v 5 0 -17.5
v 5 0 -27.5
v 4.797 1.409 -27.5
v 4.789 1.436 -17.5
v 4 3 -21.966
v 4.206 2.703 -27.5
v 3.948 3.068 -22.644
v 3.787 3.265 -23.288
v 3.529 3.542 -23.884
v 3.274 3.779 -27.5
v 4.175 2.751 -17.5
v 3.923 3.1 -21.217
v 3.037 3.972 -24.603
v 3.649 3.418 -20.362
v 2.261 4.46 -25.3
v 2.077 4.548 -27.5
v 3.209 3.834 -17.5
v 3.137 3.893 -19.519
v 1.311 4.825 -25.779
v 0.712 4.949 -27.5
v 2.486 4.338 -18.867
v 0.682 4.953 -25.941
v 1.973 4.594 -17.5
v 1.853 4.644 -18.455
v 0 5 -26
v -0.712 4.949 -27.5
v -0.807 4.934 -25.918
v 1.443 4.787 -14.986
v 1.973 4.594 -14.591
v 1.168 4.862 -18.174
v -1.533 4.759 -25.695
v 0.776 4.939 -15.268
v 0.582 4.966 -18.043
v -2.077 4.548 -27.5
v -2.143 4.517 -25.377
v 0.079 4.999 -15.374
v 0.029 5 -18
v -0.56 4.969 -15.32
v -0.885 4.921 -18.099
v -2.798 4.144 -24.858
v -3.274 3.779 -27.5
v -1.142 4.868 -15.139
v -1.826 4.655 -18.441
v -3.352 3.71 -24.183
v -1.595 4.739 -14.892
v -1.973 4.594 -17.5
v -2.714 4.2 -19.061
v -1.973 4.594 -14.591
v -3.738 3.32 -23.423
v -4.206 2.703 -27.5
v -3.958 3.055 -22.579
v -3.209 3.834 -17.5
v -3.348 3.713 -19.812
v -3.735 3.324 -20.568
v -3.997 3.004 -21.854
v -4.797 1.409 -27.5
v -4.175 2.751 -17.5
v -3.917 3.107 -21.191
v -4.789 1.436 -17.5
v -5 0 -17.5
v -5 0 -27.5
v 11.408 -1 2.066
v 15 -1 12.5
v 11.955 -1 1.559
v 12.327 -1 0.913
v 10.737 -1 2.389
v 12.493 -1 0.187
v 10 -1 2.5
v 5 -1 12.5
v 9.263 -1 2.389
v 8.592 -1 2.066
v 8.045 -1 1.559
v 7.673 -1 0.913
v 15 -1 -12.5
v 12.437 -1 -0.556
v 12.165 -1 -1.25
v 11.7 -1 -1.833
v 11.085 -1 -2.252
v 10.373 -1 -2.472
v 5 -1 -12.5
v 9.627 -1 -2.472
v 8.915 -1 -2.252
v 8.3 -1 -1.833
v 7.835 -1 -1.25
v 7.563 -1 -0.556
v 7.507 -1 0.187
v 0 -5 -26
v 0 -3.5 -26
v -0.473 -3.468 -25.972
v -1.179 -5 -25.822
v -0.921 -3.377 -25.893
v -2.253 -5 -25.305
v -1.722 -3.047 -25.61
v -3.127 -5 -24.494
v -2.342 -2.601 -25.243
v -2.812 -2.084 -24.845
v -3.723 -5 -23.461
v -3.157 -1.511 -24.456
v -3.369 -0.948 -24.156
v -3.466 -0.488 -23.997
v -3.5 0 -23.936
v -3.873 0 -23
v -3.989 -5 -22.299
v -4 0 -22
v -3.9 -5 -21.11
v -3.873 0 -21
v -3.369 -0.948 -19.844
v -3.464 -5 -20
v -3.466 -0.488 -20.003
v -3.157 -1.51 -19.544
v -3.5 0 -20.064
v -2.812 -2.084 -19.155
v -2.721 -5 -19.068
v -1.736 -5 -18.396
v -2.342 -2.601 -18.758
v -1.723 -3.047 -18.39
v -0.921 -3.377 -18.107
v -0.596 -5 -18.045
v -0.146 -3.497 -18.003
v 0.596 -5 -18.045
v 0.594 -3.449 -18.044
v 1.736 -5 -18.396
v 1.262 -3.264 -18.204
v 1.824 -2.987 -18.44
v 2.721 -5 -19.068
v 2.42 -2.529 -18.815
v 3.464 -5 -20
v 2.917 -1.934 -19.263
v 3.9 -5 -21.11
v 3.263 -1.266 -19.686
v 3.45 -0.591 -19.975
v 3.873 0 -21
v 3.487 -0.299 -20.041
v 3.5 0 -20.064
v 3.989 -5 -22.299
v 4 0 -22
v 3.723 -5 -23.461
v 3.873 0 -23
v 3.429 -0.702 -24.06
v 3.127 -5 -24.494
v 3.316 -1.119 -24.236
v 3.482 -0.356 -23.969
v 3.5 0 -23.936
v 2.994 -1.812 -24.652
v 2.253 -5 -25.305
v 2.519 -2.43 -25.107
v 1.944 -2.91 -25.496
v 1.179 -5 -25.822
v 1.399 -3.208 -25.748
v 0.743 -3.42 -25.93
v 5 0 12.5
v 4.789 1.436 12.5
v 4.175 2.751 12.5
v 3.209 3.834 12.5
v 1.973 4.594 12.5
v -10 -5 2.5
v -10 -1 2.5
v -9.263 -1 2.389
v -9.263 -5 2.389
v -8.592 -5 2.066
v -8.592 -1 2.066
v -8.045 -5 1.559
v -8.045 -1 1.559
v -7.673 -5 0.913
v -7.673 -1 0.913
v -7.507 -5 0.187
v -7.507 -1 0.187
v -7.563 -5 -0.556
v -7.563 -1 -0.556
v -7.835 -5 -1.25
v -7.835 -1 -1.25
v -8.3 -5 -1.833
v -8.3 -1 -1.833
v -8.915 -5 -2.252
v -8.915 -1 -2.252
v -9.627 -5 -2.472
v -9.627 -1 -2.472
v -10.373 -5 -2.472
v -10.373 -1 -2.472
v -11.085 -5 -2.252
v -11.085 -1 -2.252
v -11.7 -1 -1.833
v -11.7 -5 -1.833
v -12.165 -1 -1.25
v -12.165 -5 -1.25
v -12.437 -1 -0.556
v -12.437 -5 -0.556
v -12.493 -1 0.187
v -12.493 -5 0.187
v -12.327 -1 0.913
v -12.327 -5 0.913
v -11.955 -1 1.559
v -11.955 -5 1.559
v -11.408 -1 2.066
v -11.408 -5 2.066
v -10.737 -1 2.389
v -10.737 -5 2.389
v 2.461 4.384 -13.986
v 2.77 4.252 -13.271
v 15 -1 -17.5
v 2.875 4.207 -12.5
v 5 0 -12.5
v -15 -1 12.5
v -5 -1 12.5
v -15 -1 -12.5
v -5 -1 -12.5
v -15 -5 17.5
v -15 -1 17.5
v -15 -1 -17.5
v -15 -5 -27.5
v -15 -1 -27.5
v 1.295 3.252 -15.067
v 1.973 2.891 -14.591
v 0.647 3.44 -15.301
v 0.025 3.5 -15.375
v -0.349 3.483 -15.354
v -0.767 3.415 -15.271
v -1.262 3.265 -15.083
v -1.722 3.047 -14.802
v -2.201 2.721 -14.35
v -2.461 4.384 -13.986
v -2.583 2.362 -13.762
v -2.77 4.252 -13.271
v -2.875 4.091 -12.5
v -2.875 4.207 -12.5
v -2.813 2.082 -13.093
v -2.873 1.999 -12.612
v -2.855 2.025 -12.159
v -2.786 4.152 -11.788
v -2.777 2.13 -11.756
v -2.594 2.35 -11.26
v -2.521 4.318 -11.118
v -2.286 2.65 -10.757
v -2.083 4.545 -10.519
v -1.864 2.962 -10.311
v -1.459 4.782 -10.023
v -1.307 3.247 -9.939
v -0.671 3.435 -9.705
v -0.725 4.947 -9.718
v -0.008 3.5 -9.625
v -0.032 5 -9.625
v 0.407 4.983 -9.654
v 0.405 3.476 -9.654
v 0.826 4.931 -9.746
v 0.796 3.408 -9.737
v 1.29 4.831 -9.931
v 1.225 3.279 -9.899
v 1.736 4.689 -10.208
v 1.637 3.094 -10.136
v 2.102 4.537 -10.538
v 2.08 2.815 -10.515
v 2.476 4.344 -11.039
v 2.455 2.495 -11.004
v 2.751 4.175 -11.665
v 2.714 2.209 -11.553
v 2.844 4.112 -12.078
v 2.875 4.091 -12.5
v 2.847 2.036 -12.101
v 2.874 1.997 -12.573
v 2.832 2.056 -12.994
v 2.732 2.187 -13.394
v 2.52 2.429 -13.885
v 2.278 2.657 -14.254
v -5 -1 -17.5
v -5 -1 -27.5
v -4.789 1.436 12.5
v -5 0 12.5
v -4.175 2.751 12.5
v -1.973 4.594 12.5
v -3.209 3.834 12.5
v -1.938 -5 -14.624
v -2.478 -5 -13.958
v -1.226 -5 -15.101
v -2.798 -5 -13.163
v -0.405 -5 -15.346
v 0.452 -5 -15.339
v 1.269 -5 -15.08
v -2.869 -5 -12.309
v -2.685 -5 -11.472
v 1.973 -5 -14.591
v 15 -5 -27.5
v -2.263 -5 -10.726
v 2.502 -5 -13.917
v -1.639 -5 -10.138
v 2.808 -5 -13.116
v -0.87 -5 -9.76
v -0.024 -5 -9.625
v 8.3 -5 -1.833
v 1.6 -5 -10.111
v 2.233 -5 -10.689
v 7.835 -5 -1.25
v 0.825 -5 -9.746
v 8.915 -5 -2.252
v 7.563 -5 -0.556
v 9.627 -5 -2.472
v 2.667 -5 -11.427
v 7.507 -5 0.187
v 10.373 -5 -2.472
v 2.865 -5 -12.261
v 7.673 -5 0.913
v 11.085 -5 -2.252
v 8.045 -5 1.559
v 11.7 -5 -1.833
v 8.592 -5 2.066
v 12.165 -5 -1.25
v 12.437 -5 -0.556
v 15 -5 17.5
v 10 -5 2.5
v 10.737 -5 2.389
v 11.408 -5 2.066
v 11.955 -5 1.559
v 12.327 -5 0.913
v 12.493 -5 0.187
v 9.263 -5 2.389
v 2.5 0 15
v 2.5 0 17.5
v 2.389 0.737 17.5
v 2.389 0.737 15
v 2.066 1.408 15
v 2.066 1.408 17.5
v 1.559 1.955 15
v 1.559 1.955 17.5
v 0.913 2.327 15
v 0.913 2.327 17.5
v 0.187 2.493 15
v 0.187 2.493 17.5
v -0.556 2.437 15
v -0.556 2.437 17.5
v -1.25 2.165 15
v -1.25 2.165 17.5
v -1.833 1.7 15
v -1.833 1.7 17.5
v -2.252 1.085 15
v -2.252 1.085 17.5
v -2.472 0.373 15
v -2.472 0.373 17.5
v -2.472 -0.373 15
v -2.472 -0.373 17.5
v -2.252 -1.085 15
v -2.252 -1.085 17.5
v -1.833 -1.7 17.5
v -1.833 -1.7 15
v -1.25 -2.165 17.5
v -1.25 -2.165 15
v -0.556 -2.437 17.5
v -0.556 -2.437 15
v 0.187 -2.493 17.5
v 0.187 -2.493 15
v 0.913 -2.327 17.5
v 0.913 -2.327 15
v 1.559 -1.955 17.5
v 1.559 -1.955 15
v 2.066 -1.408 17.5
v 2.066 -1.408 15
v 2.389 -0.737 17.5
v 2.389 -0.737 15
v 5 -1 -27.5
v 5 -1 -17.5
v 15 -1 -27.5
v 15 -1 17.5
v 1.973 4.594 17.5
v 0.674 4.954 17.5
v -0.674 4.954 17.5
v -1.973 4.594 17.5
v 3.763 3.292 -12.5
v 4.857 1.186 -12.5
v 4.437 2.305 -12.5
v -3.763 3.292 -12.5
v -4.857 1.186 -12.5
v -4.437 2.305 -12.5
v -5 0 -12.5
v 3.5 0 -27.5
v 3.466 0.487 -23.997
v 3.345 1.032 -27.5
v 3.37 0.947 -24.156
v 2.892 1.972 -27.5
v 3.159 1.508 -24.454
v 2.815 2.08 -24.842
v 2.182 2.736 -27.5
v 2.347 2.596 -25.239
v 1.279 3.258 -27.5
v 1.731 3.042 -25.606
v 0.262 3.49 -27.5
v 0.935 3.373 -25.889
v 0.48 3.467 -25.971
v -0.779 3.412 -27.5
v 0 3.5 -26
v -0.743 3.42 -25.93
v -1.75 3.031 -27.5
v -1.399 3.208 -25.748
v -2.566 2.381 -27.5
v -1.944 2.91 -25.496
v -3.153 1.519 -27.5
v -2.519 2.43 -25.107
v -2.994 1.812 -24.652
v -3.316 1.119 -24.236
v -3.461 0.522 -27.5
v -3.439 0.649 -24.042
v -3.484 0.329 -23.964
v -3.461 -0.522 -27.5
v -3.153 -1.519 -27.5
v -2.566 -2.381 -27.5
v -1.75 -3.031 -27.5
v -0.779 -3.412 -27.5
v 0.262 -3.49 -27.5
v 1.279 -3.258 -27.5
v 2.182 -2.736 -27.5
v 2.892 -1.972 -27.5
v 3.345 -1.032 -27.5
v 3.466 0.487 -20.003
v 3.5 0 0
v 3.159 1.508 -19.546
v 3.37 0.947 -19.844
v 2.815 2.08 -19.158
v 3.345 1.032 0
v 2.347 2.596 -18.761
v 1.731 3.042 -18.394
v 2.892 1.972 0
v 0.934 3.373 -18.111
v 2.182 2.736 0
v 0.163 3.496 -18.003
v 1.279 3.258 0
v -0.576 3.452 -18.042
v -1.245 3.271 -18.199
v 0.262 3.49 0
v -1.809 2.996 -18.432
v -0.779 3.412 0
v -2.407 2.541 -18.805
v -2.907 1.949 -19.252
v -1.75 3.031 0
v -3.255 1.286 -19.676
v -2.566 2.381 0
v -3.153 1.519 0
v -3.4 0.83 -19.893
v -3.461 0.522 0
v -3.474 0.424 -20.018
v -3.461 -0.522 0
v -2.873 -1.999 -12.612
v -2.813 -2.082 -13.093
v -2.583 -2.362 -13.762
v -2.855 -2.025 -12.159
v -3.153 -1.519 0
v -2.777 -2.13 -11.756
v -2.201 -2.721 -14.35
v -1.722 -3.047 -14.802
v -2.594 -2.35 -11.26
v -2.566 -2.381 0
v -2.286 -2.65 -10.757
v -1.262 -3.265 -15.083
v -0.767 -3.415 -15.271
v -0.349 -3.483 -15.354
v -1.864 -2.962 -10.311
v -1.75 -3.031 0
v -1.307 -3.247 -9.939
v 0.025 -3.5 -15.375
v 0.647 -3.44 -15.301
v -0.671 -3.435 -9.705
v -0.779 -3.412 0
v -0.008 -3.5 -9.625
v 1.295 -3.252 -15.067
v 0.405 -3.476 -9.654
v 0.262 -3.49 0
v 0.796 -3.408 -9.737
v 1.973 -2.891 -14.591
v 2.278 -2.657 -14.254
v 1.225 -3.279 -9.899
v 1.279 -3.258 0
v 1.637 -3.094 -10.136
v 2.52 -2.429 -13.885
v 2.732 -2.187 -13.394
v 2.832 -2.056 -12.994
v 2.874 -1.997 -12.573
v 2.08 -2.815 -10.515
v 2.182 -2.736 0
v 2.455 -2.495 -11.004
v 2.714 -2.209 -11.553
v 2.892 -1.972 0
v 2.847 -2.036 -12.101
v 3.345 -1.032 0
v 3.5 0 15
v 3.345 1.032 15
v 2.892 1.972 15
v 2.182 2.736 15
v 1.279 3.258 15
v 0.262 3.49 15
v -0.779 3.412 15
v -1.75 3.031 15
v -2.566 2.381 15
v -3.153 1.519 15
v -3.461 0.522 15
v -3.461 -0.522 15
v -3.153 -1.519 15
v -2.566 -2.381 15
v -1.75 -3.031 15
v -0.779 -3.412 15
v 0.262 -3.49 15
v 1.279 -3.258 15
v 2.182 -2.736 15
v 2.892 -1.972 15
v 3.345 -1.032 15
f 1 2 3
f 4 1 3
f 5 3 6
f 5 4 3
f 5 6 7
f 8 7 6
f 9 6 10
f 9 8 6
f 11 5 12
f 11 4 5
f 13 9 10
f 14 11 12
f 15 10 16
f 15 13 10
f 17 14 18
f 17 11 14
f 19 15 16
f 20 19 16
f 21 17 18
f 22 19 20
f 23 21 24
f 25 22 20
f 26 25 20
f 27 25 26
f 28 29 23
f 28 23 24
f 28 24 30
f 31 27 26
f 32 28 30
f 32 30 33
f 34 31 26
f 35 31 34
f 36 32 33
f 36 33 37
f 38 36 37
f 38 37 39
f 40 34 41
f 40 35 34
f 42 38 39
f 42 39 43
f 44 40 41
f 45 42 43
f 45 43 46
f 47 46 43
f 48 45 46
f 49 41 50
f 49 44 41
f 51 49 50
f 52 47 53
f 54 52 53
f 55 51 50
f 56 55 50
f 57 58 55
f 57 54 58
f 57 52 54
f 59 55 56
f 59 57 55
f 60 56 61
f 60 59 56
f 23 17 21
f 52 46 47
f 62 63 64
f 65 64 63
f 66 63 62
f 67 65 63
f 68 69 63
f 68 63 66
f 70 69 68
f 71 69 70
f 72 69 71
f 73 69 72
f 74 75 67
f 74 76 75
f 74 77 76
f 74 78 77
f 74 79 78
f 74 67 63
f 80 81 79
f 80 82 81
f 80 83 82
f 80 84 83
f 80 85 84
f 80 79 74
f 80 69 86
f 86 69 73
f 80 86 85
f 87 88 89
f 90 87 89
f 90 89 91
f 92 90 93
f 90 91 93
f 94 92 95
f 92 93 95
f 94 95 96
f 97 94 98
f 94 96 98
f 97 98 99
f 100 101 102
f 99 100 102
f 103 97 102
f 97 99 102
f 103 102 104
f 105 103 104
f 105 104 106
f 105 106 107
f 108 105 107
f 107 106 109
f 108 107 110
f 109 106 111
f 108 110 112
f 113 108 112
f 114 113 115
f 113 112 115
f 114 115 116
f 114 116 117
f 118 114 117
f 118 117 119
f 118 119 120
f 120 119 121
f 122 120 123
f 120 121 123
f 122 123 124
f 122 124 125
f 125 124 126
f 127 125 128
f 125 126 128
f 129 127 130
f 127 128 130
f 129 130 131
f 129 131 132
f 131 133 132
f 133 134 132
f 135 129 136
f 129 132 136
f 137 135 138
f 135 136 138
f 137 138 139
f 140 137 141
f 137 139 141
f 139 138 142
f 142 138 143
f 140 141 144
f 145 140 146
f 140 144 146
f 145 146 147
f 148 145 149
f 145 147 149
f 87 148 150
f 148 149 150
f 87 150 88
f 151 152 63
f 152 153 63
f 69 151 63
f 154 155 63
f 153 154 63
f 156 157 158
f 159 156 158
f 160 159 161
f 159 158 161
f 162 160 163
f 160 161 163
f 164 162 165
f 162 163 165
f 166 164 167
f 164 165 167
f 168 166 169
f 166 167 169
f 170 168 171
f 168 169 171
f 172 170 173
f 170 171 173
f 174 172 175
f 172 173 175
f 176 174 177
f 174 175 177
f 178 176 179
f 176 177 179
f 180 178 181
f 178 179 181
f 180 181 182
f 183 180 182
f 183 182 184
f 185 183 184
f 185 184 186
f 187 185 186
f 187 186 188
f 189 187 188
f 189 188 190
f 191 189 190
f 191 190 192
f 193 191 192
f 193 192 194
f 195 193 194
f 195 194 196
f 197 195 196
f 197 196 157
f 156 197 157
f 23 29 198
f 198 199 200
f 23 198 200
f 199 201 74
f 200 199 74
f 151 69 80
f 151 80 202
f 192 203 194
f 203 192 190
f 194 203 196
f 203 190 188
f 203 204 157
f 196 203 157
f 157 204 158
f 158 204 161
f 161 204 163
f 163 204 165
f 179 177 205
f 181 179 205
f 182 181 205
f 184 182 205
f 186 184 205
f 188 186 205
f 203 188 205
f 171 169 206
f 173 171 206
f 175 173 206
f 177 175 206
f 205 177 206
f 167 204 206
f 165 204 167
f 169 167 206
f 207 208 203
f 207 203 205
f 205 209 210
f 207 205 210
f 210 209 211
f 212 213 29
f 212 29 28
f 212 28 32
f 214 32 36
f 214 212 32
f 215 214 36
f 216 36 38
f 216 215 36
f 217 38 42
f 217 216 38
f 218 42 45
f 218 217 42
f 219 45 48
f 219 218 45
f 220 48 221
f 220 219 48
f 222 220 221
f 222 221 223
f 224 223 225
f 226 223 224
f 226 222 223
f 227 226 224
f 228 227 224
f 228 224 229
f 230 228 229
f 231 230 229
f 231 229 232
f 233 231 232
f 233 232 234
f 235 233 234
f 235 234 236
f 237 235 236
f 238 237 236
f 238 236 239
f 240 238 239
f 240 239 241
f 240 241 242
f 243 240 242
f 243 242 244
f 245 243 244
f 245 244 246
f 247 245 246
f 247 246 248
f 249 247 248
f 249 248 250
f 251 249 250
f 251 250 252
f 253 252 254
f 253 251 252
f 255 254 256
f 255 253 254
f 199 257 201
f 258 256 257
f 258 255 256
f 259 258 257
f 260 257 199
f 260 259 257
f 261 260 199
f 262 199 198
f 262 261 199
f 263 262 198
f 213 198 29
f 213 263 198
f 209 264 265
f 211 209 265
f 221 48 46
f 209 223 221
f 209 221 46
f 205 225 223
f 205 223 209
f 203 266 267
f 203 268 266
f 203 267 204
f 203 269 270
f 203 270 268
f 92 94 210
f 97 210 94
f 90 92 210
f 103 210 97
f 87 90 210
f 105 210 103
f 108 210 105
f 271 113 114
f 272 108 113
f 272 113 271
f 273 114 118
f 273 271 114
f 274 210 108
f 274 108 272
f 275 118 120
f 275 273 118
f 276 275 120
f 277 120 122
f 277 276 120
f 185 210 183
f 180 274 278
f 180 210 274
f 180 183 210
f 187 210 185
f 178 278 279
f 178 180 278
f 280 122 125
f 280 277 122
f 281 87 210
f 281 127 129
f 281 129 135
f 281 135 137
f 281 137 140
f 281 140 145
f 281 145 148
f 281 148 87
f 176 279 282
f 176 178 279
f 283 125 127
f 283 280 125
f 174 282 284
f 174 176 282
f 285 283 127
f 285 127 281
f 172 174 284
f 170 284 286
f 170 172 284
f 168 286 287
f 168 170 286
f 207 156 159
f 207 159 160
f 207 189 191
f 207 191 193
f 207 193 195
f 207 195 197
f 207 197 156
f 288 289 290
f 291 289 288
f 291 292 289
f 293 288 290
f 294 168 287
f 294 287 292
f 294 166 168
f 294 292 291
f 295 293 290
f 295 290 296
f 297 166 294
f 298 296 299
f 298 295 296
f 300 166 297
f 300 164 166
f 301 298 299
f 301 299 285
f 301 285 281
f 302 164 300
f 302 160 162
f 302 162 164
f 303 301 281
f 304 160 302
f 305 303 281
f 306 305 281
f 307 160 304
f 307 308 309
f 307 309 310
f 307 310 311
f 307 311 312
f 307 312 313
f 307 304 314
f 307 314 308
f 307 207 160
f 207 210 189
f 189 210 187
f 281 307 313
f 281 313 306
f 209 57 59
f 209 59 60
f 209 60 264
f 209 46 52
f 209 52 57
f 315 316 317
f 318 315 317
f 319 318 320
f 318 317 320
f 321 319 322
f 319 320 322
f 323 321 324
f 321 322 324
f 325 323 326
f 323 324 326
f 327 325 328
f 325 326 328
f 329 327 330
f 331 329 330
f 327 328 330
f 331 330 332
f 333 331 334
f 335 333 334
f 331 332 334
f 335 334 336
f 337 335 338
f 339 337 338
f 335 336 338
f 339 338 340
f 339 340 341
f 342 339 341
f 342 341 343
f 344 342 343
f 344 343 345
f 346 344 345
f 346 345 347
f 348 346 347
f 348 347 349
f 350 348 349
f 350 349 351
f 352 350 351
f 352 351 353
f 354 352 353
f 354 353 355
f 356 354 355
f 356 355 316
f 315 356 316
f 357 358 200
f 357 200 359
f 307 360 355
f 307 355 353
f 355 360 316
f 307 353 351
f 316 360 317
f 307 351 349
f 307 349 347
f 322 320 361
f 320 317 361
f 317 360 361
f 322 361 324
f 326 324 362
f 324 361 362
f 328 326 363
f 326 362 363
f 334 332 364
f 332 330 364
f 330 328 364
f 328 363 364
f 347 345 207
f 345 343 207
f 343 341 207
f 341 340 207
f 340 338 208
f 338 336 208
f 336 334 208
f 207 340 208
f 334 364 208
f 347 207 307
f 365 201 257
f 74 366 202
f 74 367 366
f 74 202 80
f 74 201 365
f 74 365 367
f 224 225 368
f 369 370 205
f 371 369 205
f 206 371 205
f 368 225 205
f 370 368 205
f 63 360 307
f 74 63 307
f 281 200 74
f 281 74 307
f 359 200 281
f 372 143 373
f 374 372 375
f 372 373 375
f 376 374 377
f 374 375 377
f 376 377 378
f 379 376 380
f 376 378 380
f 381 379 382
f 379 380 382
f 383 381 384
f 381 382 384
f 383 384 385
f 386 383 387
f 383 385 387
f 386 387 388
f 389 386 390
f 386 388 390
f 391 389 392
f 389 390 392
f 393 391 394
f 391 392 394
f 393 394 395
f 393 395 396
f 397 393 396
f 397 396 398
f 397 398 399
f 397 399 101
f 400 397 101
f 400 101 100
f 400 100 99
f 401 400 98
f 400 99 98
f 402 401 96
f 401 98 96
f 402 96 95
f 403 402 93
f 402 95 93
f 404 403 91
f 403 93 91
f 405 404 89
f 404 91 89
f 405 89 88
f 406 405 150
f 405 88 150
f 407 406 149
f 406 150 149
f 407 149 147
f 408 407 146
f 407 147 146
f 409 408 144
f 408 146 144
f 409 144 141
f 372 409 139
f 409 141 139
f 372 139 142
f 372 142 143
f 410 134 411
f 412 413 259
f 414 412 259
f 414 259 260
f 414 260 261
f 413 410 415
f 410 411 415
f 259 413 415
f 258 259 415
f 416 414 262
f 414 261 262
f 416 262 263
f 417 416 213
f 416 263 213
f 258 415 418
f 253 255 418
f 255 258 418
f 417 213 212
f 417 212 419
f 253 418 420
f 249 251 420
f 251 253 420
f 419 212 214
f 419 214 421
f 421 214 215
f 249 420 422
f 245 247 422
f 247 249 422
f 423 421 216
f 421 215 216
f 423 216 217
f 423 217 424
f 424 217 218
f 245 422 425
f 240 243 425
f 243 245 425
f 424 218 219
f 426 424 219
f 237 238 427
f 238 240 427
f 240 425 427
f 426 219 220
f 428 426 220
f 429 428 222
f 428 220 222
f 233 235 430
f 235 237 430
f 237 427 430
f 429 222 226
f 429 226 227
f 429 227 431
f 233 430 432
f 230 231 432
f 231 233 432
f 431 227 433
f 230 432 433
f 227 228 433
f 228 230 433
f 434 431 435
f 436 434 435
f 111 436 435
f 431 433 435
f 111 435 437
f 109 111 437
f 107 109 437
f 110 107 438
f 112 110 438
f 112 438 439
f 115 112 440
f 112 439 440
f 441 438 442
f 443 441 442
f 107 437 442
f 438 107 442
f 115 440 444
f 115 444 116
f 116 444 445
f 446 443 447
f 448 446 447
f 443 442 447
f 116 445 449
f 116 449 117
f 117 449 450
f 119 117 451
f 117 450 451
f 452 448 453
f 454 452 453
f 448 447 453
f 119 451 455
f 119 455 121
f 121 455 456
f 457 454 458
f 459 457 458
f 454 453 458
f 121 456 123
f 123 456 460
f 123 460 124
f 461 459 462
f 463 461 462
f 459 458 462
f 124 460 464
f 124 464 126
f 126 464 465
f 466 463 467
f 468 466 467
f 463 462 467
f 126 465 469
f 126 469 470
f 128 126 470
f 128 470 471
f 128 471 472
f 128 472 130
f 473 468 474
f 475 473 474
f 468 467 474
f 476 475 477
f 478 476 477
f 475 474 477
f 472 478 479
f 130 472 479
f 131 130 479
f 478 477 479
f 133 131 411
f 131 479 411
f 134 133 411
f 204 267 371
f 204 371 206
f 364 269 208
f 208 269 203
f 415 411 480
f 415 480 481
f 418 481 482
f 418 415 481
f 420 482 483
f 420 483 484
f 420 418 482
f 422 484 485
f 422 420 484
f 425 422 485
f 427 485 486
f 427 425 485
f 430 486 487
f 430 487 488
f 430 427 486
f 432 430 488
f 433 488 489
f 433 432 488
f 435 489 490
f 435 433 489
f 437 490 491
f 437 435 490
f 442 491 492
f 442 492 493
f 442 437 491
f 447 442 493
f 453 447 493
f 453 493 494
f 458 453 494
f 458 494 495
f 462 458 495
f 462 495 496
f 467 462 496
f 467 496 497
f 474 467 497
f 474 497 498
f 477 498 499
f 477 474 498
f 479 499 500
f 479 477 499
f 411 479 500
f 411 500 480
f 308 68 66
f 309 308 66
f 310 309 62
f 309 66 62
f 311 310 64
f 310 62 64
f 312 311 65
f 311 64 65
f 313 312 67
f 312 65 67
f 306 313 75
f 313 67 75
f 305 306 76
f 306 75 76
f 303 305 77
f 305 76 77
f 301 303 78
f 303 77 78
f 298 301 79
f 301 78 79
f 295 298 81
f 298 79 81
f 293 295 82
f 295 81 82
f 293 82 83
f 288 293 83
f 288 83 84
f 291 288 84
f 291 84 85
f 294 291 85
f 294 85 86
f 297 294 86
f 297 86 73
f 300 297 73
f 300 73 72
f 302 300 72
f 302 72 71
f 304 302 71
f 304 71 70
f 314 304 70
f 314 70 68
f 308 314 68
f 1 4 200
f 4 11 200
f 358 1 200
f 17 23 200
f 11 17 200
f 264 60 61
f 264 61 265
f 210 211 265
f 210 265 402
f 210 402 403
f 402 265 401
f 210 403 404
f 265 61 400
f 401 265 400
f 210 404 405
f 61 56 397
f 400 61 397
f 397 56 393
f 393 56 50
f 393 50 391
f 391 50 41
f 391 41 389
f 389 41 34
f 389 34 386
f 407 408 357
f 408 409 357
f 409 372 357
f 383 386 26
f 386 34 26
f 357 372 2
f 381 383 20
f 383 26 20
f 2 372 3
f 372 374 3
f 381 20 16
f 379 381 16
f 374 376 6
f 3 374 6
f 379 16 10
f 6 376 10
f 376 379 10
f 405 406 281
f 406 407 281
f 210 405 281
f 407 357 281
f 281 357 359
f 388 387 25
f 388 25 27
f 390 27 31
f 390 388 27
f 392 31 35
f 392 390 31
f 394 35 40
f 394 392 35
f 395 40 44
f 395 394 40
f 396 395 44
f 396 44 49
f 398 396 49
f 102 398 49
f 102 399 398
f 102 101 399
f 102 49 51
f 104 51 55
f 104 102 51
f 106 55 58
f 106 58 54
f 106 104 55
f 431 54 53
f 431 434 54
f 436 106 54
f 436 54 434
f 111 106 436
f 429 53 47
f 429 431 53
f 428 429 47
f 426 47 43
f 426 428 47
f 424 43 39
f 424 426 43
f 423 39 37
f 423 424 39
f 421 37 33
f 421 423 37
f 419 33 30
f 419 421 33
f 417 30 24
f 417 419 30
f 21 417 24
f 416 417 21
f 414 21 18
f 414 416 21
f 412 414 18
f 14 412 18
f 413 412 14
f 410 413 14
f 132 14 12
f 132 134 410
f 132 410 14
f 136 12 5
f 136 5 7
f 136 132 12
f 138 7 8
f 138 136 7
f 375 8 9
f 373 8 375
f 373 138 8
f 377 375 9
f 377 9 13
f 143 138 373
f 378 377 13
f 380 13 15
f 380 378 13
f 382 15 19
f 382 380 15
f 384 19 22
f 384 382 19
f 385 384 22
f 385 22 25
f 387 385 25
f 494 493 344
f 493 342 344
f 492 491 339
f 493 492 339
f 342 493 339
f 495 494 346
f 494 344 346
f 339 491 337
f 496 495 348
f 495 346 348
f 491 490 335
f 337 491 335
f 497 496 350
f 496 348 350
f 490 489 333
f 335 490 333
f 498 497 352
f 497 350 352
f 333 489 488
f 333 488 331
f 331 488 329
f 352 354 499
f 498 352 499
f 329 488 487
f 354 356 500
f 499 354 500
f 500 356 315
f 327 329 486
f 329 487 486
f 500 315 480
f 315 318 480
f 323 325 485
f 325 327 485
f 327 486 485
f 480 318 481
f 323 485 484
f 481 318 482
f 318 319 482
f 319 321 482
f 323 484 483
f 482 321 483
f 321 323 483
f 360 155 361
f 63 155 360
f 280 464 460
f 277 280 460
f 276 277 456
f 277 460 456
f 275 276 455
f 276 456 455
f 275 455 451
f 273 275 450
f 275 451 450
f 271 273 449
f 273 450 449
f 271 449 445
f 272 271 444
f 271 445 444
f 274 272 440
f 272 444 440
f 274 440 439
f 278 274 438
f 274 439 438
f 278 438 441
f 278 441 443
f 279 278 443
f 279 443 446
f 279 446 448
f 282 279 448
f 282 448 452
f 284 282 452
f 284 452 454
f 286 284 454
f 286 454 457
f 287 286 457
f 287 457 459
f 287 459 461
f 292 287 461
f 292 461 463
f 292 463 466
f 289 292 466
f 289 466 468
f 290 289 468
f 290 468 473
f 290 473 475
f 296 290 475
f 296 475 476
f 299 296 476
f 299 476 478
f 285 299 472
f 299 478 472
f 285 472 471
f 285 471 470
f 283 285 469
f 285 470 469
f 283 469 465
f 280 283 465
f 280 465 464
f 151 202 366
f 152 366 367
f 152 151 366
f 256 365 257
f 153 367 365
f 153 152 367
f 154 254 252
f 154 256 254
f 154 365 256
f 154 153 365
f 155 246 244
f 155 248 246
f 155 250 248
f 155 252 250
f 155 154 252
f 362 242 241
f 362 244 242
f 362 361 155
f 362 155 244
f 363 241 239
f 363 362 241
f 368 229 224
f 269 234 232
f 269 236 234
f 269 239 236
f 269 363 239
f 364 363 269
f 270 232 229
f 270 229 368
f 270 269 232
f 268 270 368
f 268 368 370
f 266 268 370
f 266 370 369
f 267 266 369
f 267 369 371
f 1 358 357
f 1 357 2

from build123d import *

# Parameters (mm, degrees)
BOSS_EXTRUDE1_DEPTH      = 17.5
BOSS_EXTRUDE1_DEPTH_BACK = 27.5
SKETCH2_W                = 45
SKETCH2_H                = 4
BOSS_EXTRUDE2_DEPTH      = 15
BOSS_EXTRUDE2_DEPTH_BACK = 15
SKETCH3_R                = 2.5
CUT_EXTRUDE1_DEPTH       = 32.721443851
CUT_EXTRUDE1_DEPTH_BACK  = 32.721443851
RIB1_REACH               = 49.697
SKETCH5_WALL_W           = 111.57136702
SKETCH5_WALL_H           = 5
MIRROR2_COPY_1_REACH     = 49.697
MIRROR2_COPY_1_SKETCH_W  = 111.57136702
MIRROR2_COPY_1_SKETCH_H  = 5
SKETCH7_R                = 2.5
CUT_EXTRUDE2_DEPTH       = 32.721443851
CUT_EXTRUDE2_DEPTH_BACK  = 32.721443851
SKETCH8_R                = 2.875
CUT_EXTRUDE3_DEPTH       = 32.721443851
CUT_EXTRUDE3_DEPTH_BACK  = 32.721443851
SKETCH9_R                = 3.5
CUT_EXTRUDE4_DEPTH       = 15
CUT_EXTRUDE4_DEPTH_BACK  = 32.721443955
SKETCH10_R               = 4
CUT_EXTRUDE5_DEPTH       = 32.721443955
CUT_EXTRUDE5_DEPTH_BACK  = 32.721443955


with BuildPart() as part:
    # Sketch1 → Boss-Extrude1 (new, two sides)
    with BuildSketch(Plane.XY) as boss_extrude1_sk:
        with BuildLine():
            Line((-5, 0), (-5, -5))
            Line((-5, -5), (5, -5))
            Line((5, -5), (5, 0))
            ThreePointArc((5, 0), (0, 5), (-5, 0))
        make_face()
    extrude(amount=BOSS_EXTRUDE1_DEPTH)
    extrude(boss_extrude1_sk.sketch, amount=-BOSS_EXTRUDE1_DEPTH_BACK)

    # Sketch2 → Boss-Extrude2 (add, two sides)
    with BuildSketch(Plane(origin=(0, 0, 0), x_dir=(0, 0, -1), z_dir=(1, 0, 0))) as boss_extrude2_sk:
        with Locations((5, -3)):
            Rectangle(SKETCH2_W, SKETCH2_H)
    extrude(amount=BOSS_EXTRUDE2_DEPTH)
    extrude(boss_extrude2_sk.sketch, amount=-BOSS_EXTRUDE2_DEPTH_BACK)

    # Sketch3 → Cut-Extrude1 (cut, two sides)
    with BuildSketch(Plane.XY) as cut_extrude1_sk:
        Circle(SKETCH3_R)
    extrude(amount=CUT_EXTRUDE1_DEPTH, mode=Mode.SUBTRACT)
    extrude(cut_extrude1_sk.sketch, amount=-CUT_EXTRUDE1_DEPTH_BACK, mode=Mode.SUBTRACT)

    # Sketch5 wall → Rib1 (add, up to next)
    with BuildSketch(Plane(origin=(8.486476183, 1.797142734, 17.5), x_dir=(0.918857093708, -0.394590472949, 0), z_dir=(0.394590472949, 0.918857093708, 0)), mode=Mode.PRIVATE) as rib1_sk1:
        with Locations((0, 2.5)):
            Rectangle(SKETCH5_WALL_W, SKETCH5_WALL_H)
    rib1_tool1 = extrude(rib1_sk1.sketch, amount=-RIB1_REACH, mode=Mode.PRIVATE) - part.part
    rib1 = rib1_tool1.solids().sort_by_distance((8.486476183, 1.797142734, 17.5))[0]
    add(rib1)

    # Mirror1: Rib1 across plane
    add(rib1.mirror(Plane.XY))

    # Mirror2: Rib1 across plane
    add(rib1.mirror(Plane(origin=(0, 0, 0), x_dir=(0, 0, 1), z_dir=(1, 0, 0))))

    # Mirror2 copy 1 sketch → Mirror2 copy 1 (add, up to next)
    with BuildSketch(Plane(origin=(-8.486476183, 1.797142734, -17.5), x_dir=(-0.918857093708, -0.394590472949, 0), z_dir=(-0.394590472949, 0.918857093708, 0)), mode=Mode.PRIVATE) as mirror2_copy_1_sk1:
        with Locations((0, 2.5)):
            Rectangle(MIRROR2_COPY_1_SKETCH_W, MIRROR2_COPY_1_SKETCH_H)
    mirror2_copy_1_tool1 = extrude(mirror2_copy_1_sk1.sketch, amount=-MIRROR2_COPY_1_REACH, mode=Mode.PRIVATE) - part.part
    add(mirror2_copy_1_tool1.solids().sort_by_distance((-8.486476183, 1.797142734, -17.5))[0])

    # Sketch7 → Cut-Extrude2 (cut, two sides)
    with BuildSketch(Plane(origin=(0, 0, 0), x_dir=(1, 0, 0), z_dir=(0, 1, 0))) as cut_extrude2_sk:
        with Locations(Location((-10, 0, 0), (0, 0, 270))):
            Circle(SKETCH7_R)
        with Locations(Location((10, 0, 0), (0, 0, 270))):
            Circle(SKETCH7_R)
    extrude(amount=CUT_EXTRUDE2_DEPTH, mode=Mode.SUBTRACT)
    extrude(cut_extrude2_sk.sketch, amount=-CUT_EXTRUDE2_DEPTH_BACK, mode=Mode.SUBTRACT)

    # Sketch8 → Cut-Extrude3 (cut, two sides)
    with BuildSketch(Plane(origin=(0, 0, 0), x_dir=(1, 0, 0), z_dir=(0, 1, 0))) as cut_extrude3_sk:
        with Locations(Location((0, 12.5, 0), (0, 0, 46.666459534))):
            Circle(SKETCH8_R)
    extrude(amount=CUT_EXTRUDE3_DEPTH, mode=Mode.SUBTRACT)
    extrude(cut_extrude3_sk.sketch, amount=-CUT_EXTRUDE3_DEPTH_BACK, mode=Mode.SUBTRACT)

    # Sketch9 → Cut-Extrude4 (cut, two sides)
    with BuildSketch(Plane.XY) as cut_extrude4_sk:
        Circle(SKETCH9_R)
    extrude(amount=CUT_EXTRUDE4_DEPTH, mode=Mode.SUBTRACT)
    extrude(cut_extrude4_sk.sketch, amount=-CUT_EXTRUDE4_DEPTH_BACK, mode=Mode.SUBTRACT)

    # Sketch10 → Cut-Extrude5 (cut, two sides)
    with BuildSketch(Plane(origin=(0, 0, 0), x_dir=(1, 0, 0), z_dir=(0, 1, 0))) as cut_extrude5_sk:
        with Locations(Location((0, 22, 0), (0, 0, 90))):
            Circle(SKETCH10_R)
    extrude(amount=CUT_EXTRUDE5_DEPTH, mode=Mode.SUBTRACT)
    extrude(cut_extrude5_sk.sketch, amount=-CUT_EXTRUDE5_DEPTH_BACK, mode=Mode.SUBTRACT)


solid = part.part
